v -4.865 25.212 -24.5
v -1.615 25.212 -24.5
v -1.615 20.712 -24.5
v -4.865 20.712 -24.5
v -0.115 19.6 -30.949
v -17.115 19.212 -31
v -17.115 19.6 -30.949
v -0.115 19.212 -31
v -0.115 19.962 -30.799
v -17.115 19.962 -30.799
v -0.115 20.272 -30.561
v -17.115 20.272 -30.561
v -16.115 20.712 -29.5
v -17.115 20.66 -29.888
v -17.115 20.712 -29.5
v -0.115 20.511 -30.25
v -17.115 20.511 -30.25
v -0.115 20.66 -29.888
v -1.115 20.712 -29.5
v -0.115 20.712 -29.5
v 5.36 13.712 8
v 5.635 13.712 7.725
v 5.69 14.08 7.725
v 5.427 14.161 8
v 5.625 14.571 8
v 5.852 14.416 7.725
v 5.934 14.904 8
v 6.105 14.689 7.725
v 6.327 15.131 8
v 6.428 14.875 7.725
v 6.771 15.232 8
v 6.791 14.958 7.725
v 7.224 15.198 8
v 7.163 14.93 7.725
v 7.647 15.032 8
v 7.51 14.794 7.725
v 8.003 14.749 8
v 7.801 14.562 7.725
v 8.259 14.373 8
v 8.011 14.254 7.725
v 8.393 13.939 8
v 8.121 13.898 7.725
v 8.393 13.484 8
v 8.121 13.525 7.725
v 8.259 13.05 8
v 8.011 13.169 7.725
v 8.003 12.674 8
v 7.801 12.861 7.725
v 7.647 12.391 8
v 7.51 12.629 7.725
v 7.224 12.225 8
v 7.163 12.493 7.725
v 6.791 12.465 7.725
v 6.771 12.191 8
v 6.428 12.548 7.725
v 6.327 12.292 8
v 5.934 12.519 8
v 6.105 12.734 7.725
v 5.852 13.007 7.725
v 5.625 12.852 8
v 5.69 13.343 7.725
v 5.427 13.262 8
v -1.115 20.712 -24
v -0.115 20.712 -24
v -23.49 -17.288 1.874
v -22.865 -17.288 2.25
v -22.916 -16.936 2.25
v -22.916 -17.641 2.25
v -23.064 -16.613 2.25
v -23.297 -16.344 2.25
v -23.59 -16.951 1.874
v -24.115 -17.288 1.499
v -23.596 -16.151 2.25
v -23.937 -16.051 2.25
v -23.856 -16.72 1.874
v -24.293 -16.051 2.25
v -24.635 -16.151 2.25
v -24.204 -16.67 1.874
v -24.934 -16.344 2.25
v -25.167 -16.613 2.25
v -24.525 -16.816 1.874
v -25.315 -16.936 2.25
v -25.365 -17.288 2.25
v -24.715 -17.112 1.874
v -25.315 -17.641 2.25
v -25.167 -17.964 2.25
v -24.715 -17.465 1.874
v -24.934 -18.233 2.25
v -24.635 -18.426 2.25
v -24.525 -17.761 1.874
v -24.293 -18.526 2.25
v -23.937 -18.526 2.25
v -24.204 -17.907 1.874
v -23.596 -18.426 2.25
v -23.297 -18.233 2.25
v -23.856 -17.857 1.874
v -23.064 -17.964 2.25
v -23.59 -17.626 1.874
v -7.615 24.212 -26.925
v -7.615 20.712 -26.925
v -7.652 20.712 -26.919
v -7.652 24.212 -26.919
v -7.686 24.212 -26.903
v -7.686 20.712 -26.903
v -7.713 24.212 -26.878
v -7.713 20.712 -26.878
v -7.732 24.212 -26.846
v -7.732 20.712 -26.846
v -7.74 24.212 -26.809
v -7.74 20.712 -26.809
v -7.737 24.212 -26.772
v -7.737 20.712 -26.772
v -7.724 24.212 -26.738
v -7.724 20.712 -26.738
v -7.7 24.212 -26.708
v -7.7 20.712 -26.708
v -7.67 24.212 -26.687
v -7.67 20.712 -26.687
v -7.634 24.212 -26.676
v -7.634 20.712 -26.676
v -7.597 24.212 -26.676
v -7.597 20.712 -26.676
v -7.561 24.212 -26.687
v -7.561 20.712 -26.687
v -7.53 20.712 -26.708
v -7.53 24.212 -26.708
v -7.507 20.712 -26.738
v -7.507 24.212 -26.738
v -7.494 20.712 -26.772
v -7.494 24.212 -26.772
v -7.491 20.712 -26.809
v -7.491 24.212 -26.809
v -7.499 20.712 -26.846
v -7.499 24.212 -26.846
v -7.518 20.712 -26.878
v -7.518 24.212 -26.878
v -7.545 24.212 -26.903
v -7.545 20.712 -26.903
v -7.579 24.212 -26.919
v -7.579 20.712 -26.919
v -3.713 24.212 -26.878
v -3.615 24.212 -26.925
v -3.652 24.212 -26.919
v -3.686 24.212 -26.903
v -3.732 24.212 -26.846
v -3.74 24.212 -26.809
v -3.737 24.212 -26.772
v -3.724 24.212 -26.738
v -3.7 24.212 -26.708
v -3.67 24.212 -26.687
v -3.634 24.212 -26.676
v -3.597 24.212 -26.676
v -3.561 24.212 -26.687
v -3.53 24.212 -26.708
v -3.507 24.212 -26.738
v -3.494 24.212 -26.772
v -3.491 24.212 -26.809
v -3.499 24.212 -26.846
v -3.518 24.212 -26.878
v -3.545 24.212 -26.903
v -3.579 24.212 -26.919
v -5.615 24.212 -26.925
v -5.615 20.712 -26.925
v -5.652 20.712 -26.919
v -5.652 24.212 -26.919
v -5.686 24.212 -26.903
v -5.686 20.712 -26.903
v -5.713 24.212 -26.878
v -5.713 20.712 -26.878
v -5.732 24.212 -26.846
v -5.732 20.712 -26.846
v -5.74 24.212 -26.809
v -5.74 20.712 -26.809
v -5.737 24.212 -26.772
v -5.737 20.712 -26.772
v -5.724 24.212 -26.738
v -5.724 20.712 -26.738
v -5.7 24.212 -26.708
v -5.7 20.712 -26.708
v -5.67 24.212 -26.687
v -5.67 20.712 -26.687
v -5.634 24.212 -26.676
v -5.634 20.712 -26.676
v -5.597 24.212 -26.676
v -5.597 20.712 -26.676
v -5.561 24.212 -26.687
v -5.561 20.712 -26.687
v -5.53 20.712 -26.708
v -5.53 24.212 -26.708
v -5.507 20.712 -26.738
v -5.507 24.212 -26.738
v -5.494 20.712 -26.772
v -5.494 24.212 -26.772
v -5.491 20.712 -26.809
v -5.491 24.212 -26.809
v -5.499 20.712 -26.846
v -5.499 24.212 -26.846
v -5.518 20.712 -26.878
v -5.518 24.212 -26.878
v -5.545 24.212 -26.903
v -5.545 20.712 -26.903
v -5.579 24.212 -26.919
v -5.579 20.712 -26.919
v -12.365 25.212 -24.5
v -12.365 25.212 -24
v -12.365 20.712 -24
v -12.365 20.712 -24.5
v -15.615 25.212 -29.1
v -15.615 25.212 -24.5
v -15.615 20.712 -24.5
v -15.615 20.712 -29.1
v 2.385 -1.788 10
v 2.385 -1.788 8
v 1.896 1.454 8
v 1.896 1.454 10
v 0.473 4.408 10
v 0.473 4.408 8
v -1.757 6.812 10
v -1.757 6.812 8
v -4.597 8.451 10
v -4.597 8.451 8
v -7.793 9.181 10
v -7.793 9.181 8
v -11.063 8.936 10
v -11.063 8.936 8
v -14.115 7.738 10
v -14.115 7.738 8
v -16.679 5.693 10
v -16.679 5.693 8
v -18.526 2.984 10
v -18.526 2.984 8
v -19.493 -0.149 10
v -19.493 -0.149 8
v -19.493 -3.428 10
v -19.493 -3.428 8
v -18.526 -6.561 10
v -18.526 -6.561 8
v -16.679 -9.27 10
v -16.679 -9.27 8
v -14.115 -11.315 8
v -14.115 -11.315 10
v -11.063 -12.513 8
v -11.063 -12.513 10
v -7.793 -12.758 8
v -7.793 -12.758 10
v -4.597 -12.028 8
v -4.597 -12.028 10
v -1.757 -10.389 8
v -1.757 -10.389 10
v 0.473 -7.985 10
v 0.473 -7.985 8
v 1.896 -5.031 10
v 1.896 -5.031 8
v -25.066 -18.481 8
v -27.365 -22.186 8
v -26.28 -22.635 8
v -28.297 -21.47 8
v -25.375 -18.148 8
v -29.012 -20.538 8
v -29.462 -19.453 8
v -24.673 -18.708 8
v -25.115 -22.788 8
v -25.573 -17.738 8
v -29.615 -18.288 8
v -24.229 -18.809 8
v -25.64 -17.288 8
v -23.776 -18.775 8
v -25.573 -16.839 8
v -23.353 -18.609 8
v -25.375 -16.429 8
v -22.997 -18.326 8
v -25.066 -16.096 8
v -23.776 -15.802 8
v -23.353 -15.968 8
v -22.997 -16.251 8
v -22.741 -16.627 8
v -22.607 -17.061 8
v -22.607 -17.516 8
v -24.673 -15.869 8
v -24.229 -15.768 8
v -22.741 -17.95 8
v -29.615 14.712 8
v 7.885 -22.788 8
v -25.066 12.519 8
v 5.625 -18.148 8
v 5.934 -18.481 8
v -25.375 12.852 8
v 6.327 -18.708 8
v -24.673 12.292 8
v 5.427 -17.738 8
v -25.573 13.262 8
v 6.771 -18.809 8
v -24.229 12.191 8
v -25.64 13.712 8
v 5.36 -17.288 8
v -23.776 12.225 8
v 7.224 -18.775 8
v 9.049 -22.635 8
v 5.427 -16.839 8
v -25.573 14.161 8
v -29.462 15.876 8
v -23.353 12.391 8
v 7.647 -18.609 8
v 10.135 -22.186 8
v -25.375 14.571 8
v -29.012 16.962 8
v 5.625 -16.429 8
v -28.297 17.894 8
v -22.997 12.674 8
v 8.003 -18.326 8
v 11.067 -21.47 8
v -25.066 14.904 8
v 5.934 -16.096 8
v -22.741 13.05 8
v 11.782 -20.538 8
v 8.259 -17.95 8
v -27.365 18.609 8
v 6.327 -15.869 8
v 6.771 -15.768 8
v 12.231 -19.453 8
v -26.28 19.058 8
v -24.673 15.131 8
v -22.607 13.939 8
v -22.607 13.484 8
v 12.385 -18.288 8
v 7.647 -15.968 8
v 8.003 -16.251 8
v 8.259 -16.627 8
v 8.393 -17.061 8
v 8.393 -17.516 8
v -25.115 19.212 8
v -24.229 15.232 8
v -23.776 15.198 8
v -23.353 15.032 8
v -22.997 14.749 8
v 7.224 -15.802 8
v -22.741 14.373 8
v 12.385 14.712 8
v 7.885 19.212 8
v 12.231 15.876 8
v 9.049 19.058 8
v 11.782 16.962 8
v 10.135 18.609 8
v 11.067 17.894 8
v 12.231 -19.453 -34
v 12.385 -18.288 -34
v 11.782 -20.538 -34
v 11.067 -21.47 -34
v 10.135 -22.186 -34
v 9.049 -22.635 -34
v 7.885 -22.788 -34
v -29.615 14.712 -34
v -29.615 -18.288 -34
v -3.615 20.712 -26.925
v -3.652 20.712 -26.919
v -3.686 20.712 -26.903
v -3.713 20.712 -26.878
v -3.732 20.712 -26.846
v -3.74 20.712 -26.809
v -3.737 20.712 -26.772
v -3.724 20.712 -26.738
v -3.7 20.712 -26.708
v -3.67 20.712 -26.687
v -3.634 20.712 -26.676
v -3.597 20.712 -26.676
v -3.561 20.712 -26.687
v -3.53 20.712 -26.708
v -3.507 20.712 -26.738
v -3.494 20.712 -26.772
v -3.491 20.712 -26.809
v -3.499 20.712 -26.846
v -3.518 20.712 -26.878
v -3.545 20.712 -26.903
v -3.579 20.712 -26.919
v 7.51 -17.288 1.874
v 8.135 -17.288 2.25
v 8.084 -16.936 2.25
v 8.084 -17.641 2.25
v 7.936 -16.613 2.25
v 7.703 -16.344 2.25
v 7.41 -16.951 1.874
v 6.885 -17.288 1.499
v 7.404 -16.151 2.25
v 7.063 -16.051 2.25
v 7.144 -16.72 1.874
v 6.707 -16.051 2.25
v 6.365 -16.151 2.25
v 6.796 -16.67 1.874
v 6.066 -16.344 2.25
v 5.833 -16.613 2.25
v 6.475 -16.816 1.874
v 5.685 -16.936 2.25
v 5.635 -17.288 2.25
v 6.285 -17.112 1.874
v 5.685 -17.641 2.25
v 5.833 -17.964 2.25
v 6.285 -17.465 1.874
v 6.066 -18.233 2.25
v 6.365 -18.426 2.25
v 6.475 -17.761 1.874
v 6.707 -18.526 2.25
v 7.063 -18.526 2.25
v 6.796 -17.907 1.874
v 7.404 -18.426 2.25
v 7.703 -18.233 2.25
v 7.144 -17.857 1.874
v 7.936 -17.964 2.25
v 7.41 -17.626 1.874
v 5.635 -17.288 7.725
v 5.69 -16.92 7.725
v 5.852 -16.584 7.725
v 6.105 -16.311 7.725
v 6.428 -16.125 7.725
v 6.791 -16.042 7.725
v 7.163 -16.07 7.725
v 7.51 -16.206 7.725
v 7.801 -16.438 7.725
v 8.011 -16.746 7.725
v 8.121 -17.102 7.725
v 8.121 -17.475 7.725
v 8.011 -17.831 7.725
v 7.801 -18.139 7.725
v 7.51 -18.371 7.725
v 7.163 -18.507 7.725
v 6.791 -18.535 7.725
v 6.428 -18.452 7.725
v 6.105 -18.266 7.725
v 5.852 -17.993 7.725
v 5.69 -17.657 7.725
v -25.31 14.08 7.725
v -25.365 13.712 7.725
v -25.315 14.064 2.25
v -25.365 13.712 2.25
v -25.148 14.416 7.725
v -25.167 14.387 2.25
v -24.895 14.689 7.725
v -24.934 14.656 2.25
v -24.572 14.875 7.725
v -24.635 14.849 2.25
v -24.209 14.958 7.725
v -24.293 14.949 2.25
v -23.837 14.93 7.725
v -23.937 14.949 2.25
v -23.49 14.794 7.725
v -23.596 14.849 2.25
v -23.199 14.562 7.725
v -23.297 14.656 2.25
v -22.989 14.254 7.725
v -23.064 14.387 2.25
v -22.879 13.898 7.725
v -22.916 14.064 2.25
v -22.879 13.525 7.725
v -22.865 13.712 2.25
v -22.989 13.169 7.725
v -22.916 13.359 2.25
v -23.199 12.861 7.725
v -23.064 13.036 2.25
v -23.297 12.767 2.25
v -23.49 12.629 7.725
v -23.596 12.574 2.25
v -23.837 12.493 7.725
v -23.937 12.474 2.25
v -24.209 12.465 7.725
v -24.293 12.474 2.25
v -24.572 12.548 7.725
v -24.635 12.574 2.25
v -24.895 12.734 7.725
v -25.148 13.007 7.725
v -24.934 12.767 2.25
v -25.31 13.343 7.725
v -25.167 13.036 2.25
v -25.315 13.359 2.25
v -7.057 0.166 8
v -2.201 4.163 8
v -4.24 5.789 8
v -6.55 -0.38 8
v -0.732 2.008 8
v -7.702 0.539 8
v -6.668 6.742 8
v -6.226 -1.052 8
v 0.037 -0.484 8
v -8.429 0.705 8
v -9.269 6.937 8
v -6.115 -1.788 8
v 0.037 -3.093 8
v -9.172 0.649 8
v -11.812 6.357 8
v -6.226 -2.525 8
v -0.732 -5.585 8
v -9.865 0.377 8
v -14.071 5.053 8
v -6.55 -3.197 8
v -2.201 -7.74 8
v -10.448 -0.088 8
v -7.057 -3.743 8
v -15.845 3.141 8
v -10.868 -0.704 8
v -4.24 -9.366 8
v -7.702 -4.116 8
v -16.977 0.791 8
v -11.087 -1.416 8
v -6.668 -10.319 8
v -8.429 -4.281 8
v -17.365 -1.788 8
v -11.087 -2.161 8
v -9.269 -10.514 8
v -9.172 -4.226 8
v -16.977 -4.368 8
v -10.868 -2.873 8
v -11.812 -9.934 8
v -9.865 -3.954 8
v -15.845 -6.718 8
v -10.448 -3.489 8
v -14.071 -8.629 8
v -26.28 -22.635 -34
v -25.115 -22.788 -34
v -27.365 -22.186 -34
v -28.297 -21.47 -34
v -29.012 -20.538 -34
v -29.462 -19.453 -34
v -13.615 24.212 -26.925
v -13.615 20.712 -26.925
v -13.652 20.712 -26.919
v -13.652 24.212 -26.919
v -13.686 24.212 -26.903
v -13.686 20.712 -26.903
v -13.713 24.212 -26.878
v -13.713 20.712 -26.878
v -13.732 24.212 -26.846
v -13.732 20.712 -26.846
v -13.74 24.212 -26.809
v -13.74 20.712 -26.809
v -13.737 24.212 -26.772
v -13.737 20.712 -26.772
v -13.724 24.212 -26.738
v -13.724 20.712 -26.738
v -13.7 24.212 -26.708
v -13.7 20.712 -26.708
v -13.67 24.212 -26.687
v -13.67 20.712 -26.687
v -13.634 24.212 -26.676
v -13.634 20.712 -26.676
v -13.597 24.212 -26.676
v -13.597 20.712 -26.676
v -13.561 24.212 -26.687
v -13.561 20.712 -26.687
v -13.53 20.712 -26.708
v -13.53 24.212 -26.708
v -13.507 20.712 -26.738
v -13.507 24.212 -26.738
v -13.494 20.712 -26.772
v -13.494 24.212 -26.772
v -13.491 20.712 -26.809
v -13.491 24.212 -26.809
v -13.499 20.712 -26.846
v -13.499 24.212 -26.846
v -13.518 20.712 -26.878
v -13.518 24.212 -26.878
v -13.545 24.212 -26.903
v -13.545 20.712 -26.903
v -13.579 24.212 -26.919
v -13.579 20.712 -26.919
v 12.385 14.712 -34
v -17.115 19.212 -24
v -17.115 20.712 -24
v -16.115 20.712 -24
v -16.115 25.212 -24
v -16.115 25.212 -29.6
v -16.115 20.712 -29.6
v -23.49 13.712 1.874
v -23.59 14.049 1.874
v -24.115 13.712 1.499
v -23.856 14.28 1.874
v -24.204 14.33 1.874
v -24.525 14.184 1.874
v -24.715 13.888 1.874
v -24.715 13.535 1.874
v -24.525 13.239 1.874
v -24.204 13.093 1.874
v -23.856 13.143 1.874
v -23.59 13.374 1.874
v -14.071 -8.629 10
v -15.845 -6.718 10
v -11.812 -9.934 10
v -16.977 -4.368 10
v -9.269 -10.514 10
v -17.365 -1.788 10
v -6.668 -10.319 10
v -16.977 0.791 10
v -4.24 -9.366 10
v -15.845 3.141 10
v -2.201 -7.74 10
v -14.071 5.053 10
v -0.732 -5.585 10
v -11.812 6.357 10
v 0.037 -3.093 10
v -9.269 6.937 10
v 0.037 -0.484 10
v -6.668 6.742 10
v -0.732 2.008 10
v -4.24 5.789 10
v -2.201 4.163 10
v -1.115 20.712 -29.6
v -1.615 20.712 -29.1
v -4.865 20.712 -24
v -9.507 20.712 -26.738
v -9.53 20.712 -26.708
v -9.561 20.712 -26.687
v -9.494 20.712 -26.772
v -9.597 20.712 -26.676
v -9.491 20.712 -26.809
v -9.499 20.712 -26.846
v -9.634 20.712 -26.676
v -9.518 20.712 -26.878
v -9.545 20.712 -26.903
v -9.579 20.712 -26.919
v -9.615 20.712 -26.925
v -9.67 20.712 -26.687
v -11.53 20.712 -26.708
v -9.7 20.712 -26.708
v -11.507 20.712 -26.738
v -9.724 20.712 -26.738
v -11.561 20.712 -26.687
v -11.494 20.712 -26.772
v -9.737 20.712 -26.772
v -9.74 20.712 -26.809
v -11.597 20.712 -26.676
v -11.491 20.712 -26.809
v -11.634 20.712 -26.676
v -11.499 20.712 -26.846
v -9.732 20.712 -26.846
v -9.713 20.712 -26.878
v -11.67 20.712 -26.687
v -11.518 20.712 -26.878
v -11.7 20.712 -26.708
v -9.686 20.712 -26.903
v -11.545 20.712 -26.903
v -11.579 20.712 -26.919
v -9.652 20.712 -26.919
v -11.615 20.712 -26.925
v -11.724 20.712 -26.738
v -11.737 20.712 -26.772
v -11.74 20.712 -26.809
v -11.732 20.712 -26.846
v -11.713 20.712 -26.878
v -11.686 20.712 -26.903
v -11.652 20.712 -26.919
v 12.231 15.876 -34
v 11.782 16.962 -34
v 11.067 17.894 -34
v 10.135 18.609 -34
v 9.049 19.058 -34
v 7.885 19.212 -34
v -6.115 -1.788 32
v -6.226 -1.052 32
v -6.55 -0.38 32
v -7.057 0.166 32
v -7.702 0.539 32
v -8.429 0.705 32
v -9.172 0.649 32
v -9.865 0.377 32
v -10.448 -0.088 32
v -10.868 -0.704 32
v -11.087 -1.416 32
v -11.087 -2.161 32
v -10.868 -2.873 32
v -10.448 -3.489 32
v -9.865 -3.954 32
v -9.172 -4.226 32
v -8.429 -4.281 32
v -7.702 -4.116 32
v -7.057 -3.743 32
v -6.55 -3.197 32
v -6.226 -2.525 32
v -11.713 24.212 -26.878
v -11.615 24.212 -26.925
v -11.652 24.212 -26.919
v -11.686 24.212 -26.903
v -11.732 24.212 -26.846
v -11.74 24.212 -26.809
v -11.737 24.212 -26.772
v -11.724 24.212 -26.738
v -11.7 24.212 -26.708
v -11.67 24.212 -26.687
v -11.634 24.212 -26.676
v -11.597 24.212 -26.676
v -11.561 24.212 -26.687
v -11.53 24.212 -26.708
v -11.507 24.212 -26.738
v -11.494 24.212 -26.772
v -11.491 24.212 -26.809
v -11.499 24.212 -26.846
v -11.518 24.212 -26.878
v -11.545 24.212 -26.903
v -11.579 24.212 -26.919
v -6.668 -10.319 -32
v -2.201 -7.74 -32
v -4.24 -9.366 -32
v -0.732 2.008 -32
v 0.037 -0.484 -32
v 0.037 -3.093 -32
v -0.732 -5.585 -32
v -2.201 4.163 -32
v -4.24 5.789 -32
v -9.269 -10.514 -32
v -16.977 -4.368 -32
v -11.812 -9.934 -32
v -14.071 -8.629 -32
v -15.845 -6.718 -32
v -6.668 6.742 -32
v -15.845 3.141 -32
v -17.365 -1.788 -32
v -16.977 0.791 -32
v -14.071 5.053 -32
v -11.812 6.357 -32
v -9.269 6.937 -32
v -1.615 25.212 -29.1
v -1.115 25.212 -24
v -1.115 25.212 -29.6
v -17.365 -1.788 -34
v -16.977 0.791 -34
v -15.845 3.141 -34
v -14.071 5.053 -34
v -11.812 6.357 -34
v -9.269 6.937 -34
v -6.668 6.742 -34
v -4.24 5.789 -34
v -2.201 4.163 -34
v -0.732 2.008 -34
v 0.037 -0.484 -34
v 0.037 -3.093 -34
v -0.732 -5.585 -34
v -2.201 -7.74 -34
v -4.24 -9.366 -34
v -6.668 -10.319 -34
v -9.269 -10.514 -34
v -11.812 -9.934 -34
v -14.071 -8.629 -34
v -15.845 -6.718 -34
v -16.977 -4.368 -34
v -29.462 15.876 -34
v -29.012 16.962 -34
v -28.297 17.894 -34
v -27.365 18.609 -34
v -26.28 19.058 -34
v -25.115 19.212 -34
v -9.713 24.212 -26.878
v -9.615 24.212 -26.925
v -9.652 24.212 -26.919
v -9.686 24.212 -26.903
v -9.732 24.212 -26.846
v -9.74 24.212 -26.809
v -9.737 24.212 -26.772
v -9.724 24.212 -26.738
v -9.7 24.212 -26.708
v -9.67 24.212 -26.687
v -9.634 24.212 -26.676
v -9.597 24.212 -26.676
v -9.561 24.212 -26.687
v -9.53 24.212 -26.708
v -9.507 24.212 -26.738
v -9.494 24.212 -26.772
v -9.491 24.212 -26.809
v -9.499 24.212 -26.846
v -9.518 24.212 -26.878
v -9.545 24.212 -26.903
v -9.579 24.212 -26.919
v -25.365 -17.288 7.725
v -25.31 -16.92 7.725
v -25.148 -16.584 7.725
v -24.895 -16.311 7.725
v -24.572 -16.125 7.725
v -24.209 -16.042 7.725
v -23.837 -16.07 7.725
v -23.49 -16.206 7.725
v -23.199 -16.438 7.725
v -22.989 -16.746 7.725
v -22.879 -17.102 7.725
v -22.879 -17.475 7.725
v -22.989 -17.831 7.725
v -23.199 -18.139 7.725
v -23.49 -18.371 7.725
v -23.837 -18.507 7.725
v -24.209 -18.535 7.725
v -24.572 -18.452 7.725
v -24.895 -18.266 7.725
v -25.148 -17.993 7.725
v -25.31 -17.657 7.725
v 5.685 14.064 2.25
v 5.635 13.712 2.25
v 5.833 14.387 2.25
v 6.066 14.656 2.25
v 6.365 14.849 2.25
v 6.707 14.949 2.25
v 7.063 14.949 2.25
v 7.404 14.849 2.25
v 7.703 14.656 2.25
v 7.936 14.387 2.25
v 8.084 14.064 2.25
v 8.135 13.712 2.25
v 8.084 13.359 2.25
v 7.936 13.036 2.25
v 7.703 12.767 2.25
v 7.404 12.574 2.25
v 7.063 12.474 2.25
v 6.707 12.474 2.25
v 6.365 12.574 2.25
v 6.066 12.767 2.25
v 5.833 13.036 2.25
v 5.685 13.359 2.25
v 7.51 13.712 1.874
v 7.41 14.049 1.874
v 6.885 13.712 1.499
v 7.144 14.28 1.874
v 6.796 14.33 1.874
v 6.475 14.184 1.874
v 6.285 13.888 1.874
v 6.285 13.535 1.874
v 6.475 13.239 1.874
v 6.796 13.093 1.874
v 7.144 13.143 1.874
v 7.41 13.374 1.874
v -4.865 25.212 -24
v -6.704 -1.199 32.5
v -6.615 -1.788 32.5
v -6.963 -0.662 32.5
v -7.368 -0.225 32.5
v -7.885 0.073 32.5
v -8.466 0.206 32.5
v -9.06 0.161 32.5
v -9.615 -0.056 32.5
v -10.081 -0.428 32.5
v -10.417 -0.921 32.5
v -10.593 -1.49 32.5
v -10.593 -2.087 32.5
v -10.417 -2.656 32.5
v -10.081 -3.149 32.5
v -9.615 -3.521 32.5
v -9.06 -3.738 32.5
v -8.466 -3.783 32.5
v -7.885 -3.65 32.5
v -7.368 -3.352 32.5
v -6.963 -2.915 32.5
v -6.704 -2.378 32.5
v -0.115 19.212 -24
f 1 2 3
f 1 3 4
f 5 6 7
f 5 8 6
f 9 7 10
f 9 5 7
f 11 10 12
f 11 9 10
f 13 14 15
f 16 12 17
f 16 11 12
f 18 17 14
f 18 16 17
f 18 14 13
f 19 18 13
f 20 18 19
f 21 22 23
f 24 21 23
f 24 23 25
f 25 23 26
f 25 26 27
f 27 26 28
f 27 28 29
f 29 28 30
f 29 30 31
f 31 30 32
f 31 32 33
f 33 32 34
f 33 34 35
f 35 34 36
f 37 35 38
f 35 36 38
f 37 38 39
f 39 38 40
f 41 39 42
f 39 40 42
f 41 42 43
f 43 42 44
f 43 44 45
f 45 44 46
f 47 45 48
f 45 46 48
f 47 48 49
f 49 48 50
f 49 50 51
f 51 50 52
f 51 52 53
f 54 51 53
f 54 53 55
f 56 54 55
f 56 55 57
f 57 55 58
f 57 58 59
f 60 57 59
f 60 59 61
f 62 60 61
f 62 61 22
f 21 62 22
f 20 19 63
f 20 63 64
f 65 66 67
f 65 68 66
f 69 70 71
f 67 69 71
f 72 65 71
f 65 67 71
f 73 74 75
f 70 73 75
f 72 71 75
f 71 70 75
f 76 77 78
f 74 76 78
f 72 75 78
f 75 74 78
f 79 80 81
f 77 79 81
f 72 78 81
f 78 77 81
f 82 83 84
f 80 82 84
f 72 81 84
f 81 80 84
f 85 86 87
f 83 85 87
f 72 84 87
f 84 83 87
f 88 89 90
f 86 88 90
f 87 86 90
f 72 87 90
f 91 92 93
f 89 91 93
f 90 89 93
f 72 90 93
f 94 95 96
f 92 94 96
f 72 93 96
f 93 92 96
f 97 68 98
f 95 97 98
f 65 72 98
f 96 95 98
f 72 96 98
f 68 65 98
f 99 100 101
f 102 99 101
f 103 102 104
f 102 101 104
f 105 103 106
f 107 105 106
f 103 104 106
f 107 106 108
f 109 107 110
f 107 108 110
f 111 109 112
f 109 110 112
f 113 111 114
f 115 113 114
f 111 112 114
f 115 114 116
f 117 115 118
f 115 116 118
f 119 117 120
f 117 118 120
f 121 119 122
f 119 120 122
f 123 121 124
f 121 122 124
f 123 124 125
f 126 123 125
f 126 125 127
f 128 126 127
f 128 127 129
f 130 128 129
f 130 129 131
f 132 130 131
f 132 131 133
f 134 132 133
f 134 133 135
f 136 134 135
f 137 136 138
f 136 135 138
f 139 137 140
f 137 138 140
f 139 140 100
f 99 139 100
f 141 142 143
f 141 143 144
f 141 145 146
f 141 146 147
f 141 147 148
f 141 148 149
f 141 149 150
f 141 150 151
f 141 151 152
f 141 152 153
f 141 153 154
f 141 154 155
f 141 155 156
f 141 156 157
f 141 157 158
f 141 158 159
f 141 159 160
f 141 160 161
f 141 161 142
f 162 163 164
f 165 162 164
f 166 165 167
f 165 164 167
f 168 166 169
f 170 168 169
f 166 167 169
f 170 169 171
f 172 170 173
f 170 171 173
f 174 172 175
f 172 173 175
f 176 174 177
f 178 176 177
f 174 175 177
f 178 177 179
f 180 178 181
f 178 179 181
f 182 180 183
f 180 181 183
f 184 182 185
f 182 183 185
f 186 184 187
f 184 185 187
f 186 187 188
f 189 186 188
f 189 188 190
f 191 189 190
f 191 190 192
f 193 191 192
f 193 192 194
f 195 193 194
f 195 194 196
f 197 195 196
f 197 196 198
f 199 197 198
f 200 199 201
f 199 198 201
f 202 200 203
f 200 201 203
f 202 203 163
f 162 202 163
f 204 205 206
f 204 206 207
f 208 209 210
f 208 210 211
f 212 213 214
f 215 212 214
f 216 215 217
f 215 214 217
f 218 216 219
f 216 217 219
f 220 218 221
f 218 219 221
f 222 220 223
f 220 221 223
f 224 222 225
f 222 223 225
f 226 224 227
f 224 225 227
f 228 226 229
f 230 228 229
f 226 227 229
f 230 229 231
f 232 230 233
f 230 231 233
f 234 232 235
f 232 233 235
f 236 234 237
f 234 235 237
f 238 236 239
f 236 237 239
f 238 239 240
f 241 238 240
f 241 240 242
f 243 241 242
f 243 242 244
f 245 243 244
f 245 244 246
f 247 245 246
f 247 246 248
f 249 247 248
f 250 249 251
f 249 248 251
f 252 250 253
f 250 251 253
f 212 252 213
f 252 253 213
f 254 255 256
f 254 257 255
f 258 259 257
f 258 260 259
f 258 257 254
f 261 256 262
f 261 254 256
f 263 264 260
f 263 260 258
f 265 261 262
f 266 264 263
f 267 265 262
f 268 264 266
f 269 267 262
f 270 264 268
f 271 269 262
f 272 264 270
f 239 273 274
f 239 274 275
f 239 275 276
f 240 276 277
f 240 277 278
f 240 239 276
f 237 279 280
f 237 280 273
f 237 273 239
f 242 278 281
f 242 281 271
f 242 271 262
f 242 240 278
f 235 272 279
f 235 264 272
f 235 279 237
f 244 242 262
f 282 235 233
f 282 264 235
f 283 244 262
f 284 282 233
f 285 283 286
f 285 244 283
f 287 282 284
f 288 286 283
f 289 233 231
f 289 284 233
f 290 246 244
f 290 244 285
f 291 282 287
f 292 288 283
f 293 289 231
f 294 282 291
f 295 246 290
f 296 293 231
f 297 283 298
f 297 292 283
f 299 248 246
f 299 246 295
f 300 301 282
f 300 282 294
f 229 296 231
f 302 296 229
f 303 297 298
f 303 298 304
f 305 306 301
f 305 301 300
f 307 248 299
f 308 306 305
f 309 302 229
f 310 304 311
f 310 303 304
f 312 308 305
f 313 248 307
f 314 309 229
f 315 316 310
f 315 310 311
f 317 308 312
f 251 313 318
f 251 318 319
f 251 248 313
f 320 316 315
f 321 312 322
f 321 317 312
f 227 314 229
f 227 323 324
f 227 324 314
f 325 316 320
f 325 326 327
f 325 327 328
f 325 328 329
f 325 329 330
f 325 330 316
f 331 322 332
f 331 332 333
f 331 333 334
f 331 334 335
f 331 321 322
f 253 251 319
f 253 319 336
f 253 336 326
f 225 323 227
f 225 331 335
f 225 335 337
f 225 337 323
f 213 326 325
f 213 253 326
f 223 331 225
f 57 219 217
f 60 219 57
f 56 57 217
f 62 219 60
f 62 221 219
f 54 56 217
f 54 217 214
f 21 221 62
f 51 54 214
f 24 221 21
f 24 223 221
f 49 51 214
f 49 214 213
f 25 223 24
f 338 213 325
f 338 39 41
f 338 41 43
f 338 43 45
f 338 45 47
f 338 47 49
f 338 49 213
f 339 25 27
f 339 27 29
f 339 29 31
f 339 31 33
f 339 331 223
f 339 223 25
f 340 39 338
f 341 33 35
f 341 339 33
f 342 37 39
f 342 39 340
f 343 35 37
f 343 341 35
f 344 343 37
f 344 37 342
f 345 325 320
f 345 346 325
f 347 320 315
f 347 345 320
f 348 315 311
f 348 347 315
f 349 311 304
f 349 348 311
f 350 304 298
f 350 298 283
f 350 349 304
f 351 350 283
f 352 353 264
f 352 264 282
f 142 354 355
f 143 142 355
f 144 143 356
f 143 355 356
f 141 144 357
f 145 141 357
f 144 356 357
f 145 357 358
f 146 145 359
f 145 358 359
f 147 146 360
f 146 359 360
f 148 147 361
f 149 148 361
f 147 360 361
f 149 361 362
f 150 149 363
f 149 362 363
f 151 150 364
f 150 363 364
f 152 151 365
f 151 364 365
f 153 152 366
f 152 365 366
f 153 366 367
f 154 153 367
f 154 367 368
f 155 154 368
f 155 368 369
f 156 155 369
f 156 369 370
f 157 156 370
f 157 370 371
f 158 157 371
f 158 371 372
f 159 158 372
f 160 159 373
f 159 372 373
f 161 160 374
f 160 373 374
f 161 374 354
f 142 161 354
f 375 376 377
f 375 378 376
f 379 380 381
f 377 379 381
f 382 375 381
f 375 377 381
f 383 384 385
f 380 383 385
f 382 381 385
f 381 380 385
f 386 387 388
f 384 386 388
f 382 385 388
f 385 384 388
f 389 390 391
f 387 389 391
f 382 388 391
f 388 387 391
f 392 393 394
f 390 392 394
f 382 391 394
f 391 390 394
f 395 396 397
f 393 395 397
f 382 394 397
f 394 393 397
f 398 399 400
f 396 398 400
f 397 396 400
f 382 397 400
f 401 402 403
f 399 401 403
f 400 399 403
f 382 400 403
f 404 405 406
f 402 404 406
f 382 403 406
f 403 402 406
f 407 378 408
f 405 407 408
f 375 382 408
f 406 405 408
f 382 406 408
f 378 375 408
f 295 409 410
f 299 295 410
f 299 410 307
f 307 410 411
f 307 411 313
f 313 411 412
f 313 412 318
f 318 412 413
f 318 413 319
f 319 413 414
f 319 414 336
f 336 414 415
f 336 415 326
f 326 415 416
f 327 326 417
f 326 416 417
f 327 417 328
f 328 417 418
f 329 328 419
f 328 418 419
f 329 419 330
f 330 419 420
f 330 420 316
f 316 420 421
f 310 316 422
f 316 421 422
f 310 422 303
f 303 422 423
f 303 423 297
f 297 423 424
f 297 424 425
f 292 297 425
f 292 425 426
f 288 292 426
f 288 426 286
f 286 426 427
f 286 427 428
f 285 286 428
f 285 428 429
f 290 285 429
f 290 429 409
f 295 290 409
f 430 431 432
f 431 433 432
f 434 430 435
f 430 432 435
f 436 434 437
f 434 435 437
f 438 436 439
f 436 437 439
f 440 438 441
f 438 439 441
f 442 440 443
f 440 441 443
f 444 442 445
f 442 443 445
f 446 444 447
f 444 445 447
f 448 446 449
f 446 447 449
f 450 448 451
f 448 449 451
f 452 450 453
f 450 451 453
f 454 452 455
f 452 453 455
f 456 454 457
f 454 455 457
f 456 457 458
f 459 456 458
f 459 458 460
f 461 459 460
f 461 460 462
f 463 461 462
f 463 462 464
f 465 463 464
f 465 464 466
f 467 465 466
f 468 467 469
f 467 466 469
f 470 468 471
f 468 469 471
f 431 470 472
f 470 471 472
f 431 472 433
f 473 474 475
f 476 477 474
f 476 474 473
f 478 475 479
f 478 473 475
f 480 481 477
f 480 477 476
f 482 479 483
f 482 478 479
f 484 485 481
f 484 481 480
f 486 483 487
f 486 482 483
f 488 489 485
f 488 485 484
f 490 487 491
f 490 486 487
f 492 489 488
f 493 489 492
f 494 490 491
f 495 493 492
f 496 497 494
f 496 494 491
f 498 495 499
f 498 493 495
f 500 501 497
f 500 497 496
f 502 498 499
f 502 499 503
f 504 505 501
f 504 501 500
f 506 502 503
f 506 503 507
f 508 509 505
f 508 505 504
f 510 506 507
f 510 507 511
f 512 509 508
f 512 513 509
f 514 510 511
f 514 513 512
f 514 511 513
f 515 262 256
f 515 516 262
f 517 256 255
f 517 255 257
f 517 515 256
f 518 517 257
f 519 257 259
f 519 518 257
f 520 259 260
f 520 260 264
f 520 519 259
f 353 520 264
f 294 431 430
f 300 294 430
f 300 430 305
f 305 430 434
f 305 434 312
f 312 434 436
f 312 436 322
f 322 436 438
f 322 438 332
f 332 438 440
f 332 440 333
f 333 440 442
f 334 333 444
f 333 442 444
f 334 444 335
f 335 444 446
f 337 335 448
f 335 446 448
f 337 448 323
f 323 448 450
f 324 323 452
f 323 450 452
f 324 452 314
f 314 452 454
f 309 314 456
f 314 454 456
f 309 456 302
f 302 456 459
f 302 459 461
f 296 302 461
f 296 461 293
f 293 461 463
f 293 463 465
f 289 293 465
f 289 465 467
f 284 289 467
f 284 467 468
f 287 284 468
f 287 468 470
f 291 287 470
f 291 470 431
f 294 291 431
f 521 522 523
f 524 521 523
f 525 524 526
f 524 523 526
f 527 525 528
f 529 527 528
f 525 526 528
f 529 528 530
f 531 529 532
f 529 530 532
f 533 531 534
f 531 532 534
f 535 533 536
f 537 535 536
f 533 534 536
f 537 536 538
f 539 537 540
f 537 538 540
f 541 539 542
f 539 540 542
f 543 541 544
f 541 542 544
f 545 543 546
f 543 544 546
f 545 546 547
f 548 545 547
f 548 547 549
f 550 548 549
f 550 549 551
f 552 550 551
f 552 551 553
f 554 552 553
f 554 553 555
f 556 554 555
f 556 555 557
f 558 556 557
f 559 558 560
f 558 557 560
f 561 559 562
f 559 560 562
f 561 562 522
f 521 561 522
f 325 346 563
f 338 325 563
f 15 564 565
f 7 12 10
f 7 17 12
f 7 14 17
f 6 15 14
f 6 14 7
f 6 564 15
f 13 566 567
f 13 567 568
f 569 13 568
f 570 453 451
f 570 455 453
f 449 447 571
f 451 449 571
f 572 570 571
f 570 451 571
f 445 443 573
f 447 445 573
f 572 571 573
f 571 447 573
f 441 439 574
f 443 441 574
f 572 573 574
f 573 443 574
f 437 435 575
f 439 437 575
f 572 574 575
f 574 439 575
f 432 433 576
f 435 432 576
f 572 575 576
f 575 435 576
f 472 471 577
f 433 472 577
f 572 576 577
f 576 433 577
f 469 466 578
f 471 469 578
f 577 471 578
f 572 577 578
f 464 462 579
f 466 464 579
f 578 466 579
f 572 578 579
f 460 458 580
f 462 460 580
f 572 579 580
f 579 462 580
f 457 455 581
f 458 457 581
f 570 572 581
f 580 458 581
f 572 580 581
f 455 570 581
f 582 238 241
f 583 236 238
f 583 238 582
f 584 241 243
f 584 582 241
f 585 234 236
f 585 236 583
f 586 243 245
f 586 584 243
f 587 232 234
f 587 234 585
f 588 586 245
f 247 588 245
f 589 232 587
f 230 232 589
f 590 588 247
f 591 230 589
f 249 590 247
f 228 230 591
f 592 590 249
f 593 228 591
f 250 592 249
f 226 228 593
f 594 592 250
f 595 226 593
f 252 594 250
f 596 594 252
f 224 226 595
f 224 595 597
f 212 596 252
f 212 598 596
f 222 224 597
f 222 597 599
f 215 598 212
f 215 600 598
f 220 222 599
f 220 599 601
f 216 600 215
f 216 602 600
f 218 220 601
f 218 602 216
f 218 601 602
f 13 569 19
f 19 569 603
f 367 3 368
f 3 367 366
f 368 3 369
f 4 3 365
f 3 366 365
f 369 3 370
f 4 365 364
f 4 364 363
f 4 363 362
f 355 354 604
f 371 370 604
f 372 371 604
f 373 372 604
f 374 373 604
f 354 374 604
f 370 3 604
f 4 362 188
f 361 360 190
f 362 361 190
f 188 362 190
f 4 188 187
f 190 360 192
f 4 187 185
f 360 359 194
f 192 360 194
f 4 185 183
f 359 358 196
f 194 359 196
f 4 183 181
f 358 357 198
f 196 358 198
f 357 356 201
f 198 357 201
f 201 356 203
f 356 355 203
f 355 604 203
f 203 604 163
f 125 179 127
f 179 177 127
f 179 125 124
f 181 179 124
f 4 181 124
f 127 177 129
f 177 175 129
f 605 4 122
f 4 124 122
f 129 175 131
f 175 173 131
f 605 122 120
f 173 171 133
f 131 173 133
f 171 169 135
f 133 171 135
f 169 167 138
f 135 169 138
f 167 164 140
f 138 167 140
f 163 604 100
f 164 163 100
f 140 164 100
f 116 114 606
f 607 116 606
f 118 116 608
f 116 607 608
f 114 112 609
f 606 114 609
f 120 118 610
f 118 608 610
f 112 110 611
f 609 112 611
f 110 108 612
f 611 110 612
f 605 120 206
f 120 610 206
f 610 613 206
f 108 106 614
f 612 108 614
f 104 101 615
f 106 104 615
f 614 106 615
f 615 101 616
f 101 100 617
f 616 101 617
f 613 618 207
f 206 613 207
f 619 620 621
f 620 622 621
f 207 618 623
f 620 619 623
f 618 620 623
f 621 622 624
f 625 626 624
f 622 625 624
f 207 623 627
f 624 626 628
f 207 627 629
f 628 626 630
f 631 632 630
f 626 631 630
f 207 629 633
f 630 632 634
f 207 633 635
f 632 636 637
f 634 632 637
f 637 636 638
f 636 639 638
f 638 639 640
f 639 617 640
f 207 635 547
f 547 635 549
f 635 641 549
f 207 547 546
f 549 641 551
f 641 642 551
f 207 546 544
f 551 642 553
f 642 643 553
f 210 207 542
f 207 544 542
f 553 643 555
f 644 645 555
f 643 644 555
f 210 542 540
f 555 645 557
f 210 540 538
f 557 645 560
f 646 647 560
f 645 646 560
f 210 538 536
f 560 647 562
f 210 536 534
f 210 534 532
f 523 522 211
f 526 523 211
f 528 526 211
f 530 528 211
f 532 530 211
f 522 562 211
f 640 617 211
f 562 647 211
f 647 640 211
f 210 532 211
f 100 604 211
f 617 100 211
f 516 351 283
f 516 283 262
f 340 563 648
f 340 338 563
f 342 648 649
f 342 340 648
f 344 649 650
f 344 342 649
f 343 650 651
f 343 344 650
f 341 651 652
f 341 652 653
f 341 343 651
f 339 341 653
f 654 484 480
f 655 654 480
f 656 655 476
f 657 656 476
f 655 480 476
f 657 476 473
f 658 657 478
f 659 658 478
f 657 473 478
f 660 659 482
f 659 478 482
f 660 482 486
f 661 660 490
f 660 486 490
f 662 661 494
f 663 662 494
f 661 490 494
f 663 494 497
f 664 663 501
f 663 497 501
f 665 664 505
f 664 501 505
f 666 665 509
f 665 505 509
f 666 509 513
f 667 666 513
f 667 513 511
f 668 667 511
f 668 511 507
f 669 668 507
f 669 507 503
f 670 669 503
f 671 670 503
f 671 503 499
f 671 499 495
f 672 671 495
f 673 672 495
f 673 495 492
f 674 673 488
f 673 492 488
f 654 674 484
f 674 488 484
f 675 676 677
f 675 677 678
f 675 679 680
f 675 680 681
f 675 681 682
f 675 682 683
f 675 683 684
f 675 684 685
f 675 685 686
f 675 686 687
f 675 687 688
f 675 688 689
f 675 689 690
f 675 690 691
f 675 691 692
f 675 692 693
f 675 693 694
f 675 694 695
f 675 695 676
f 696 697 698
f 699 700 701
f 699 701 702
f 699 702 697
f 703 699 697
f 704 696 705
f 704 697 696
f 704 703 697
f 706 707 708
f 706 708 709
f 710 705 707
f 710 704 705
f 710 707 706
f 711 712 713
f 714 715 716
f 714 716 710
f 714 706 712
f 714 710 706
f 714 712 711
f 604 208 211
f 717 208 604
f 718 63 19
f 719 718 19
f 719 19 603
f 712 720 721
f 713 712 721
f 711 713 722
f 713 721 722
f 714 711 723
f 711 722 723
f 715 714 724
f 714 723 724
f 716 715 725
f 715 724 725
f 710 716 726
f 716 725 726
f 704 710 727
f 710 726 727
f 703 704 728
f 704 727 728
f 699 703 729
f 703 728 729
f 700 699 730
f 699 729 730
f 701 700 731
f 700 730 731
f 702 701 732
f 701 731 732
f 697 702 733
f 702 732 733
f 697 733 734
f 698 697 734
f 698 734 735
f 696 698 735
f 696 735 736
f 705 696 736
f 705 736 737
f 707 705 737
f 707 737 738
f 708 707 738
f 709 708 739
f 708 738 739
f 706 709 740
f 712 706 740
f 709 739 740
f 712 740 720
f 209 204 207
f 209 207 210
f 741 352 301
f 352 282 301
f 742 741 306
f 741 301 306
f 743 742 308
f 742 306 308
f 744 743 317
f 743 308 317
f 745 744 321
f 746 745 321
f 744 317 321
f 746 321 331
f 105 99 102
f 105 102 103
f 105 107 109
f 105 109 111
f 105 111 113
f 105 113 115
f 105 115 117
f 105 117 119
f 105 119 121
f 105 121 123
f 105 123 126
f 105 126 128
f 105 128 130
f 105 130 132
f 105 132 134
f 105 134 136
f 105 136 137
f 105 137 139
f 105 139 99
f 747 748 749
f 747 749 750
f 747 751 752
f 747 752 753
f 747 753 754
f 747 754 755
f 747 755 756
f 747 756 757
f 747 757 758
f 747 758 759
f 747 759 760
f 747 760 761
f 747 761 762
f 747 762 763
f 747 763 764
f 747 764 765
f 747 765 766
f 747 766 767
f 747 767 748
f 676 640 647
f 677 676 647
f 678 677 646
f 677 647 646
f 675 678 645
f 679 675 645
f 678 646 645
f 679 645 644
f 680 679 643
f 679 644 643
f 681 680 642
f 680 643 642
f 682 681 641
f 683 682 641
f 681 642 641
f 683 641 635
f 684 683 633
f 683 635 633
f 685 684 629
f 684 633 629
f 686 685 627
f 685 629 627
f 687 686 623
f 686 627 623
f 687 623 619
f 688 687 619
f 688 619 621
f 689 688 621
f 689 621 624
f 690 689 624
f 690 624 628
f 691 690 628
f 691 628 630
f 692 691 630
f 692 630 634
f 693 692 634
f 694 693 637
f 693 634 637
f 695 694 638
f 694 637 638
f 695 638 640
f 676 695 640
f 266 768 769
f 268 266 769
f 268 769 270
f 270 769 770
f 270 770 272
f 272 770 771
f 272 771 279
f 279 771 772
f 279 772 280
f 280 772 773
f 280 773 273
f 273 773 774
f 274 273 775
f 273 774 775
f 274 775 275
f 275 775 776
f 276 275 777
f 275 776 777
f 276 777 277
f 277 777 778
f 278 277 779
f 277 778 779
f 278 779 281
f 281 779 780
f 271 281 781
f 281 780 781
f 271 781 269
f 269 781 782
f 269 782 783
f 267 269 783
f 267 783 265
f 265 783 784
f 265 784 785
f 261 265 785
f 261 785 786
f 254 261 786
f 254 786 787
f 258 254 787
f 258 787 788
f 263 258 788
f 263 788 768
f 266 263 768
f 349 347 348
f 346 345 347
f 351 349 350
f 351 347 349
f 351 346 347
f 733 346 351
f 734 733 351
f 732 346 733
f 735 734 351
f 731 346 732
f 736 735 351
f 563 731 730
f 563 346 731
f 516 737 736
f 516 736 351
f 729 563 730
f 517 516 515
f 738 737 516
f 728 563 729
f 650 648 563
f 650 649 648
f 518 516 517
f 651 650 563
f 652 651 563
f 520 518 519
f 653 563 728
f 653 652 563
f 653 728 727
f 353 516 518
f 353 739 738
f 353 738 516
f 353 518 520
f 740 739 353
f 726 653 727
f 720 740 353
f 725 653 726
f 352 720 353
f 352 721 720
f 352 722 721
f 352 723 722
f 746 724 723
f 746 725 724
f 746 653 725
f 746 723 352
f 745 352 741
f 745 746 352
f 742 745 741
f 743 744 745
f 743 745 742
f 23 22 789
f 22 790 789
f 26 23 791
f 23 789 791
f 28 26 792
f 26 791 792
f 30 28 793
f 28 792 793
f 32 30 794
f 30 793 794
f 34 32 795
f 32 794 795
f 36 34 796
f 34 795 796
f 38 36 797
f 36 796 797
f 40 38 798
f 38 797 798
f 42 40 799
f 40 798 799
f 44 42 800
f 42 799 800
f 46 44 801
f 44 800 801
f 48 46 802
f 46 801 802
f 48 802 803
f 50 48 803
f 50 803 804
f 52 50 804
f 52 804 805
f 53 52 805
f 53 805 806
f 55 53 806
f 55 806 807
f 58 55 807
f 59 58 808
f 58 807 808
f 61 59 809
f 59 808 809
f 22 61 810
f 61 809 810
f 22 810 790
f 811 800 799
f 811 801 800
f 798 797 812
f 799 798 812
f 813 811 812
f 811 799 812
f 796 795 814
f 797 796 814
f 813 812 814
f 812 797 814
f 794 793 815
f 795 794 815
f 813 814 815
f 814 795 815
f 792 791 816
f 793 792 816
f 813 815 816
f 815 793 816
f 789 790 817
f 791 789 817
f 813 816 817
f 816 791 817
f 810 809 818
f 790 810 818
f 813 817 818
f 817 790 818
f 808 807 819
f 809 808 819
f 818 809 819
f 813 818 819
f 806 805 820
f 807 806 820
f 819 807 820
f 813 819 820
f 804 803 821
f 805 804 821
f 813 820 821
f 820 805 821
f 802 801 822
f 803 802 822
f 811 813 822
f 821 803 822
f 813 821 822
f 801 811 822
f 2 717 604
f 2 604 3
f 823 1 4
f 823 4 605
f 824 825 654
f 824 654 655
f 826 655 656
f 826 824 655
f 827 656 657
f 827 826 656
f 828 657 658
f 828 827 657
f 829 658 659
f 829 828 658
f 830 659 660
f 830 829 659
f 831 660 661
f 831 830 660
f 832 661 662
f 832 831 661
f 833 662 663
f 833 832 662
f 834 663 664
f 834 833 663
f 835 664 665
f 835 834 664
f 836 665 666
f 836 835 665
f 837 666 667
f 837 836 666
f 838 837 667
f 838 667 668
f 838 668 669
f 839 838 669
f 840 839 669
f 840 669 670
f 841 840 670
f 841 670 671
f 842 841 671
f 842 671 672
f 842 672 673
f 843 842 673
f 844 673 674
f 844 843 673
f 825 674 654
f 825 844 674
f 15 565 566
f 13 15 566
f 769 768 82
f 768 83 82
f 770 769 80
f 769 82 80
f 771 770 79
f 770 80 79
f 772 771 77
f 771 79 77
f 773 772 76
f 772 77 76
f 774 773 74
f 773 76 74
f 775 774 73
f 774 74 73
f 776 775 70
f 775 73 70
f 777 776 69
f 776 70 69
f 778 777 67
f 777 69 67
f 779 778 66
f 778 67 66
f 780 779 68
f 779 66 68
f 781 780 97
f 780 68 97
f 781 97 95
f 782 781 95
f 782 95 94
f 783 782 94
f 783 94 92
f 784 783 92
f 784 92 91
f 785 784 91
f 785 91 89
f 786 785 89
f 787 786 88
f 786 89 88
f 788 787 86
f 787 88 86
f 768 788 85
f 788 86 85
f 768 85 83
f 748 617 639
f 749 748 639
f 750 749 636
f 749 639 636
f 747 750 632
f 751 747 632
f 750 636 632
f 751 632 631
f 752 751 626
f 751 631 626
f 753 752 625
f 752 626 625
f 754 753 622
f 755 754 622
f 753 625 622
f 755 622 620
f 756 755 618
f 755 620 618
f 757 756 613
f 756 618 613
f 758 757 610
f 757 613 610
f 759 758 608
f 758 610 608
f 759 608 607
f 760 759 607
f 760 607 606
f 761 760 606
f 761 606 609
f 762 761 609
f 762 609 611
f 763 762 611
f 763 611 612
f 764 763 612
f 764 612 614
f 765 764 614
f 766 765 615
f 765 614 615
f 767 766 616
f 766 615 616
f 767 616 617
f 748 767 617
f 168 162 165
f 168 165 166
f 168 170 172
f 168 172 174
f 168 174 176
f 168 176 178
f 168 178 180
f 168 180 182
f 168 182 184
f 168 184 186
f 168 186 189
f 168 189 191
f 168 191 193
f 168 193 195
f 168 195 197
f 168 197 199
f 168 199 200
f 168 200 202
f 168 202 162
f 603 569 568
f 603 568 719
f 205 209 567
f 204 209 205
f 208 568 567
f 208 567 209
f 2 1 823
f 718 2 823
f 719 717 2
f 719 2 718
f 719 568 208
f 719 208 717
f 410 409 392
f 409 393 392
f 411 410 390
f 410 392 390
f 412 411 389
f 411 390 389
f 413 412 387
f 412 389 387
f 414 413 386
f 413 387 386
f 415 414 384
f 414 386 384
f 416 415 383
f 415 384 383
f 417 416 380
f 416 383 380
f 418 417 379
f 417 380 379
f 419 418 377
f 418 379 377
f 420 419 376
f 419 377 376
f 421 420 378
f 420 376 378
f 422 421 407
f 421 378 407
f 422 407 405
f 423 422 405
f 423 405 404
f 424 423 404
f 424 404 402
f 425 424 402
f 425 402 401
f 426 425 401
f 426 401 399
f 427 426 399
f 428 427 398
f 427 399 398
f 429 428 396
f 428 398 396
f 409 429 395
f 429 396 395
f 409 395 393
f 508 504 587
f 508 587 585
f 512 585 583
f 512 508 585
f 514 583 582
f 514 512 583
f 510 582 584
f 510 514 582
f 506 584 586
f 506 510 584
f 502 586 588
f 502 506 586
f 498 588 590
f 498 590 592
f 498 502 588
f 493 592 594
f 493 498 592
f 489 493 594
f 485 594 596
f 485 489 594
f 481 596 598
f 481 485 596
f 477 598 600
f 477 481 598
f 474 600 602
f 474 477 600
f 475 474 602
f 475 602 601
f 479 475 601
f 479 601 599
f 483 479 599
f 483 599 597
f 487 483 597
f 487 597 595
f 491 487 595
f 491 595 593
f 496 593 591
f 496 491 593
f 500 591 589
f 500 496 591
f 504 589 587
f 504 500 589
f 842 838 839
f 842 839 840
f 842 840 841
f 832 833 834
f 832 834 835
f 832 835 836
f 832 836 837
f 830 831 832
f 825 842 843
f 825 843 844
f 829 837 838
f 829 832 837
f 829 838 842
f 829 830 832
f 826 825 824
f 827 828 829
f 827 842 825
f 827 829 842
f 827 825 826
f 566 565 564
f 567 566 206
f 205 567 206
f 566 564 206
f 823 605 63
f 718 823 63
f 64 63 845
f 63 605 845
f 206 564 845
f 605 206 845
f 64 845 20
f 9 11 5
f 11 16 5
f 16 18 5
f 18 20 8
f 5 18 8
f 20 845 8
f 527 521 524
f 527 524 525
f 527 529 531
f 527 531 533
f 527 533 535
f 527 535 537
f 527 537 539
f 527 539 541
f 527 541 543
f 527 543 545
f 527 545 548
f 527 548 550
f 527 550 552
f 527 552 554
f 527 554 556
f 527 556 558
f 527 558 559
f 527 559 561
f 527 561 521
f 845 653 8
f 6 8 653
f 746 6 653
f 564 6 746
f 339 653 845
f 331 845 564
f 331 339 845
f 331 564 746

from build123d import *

# Parameters (mm, degrees)
SKETCH1_W                       = 42
SKETCH1_H                       = 42
BOSS_EXTRUDE2_DEPTH             = 8
SKETCH2_R                       = 11
BOSS_EXTRUDE3_DEPTH             = 2
SKETCH4_W                       = 42
SKETCH4_H                       = 42
BOSS_EXTRUDE5_DEPTH             = 24
SKETCH5_W                       = 42
SKETCH5_H                       = 42
BOSS_EXTRUDE6_DEPTH             = 10
FILLET1_R                       = 4.5
SKETCH7_R                       = 8.75
CUT_EXTRUDE1_DEPTH              = 2
CUT_EXTRUDE2_START              = -2
SKETCH8_R                       = 8.75
CUT_EXTRUDE2_DEPTH              = 2
SKETCH9_R                       = 2.5
BOSS_EXTRUDE9_DEPTH             = 24.5
CHAMFER2_SIZE                   = 0.5
M3X0_5_TAPPED_HOLE1_D           = 2.5
M3X0_5_TAPPED_HOLE1_DEPTH       = 5.75
M3X0_5_TAPPED_HOLE1_CSINK_D     = 3.05
M3X0_5_TAPPED_HOLE1_CSINK_ANGLE = 90
M3X0_5_TAPPED_HOLE1_TIP         = 0.751075774
SKETCH12_W                      = 17
SKETCH12_H                      = 7
BOSS_EXTRUDE10_DEPTH            = 1.5
FILLET2_R                       = 1.5
SKETCH13_W                      = 15
SKETCH13_H                      = 5.6
BOSS_EXTRUDE11_DEPTH            = 4.5
CUT_EXTRUDE3_DEPTH              = 4.5
SKETCH16_R                      = 0.125
BOSS_EXTRUDE12_DEPTH            = 3.5
LPATTERN1_COUNT                 = 6
LPATTERN1_PITCH                 = 2


with BuildPart() as part:
    # Sketch1 → Boss-Extrude2 (new body)
    with BuildSketch(Plane.XY):
        with Locations((-8.615384615, -1.788461538)):
            Rectangle(SKETCH1_W, SKETCH1_H)
    extrude(amount=BOSS_EXTRUDE2_DEPTH)

    # Sketch2 → Boss-Extrude3 (add)
    with BuildSketch(Plane.XY.offset(8)):
        with Locations((-8.615384615, -1.788461538)):
            Circle(SKETCH2_R)
    extrude(amount=BOSS_EXTRUDE3_DEPTH)

    # Sketch4 → Boss-Extrude5 (add)
    with BuildSketch(Plane(origin=(0, 0, 0), x_dir=(-1, 0, 0), z_dir=(0, 0, -1))):
        with Locations((8.615384615, -1.788461538)):
            Rectangle(SKETCH4_W, SKETCH4_H)
    extrude(amount=BOSS_EXTRUDE5_DEPTH)

    # Sketch5 → Boss-Extrude6 (add)
    with BuildSketch(Plane(origin=(0, 0, -24), x_dir=(-1, 0, 0), z_dir=(0, 0, -1))):
        with Locations((8.615384615, -1.788461538)):
            Rectangle(SKETCH5_W, SKETCH5_H)
    extrude(amount=BOSS_EXTRUDE6_DEPTH)

    # Fillet1
    fillet1_edges = [part.edges().sort_by_distance(p)[0] for p in [
        (-29.615384615, 19.211538462, -13),
        (12.384615385, 19.211538462, -13),
        (12.384615385, -22.788461538, -13),
        (-29.615384615, -22.788461538, -13),
    ]]
    fillet(fillet1_edges, radius=FILLET1_R)

    # Sketch7 → Cut-Extrude1 (cut)
    with BuildSketch(Plane(origin=(0, 0, -34), x_dir=(-1, 0, 0), z_dir=(0, 0, -1))):
        with Locations((8.615384615, -1.788461538)):
            Circle(SKETCH7_R)
    extrude(amount=-CUT_EXTRUDE1_DEPTH, mode=Mode.SUBTRACT)

    # Sketch8 → Cut-Extrude2 (cut)
    with BuildSketch(Plane.XY.offset(10).offset(CUT_EXTRUDE2_START)):
        with Locations(Location((-8.615384615, -1.788461538, 0), (0, 0, 180))):
            Circle(SKETCH8_R)
    extrude(amount=CUT_EXTRUDE2_DEPTH, mode=Mode.SUBTRACT)

    # Sketch9 → Boss-Extrude9 (add)
    with BuildSketch(Plane.XY.offset(8)):
        with Locations((-8.615384615, -1.788461538)):
            Circle(SKETCH9_R)
    extrude(amount=BOSS_EXTRUDE9_DEPTH)

    # Chamfer2
    chamfer2_edges = [part.edges().sort_by_distance(p)[0] for p in [
        (-11.115384615, -1.788461538, 32.5),
    ]]
    chamfer(chamfer2_edges, length=CHAMFER2_SIZE)

    # M3x0.5 Tapped Hole1
    with Locations(Plane(origin=(-24.115384615, 13.711538462, 8), x_dir=(1, 0, 0), z_dir=(0, 0, 1))):
        with Locations((0, 0), (31, 0), (31, -31), (0, -31)):
            CounterSinkHole(M3X0_5_TAPPED_HOLE1_D / 2, M3X0_5_TAPPED_HOLE1_CSINK_D / 2, depth=M3X0_5_TAPPED_HOLE1_DEPTH, counter_sink_angle=M3X0_5_TAPPED_HOLE1_CSINK_ANGLE)
            with Locations((0, 0, -(M3X0_5_TAPPED_HOLE1_DEPTH + M3X0_5_TAPPED_HOLE1_TIP / 2))):  # 118° drill point
                Cone(0, M3X0_5_TAPPED_HOLE1_D / 2, M3X0_5_TAPPED_HOLE1_TIP, mode=Mode.SUBTRACT)

    # Sketch12 → Boss-Extrude10 (add)
    with BuildSketch(Plane(origin=(0, 19.211538462, 0), x_dir=(1, 0, 0), z_dir=(0, 1, 0))):
        with Locations((-8.615384615, 27.5)):
            Rectangle(SKETCH12_W, SKETCH12_H)
    extrude(amount=BOSS_EXTRUDE10_DEPTH)

    # Fillet2
    fillet2_edges = [part.edges().sort_by_distance(p)[0] for p in [
        (-8.615384615, 20.711538462, -31),
    ]]
    fillet(fillet2_edges, radius=FILLET2_R - 0.0001)  # a hair under: the kernel refuses the full size

    # Sketch13 → Boss-Extrude11 (add)
    with BuildSketch(Plane(origin=(0, 20.711538462, 0), x_dir=(1, 0, 0), z_dir=(0, 1, 0))):
        with Locations((-8.615384615, 26.8)):
            Rectangle(SKETCH13_W, SKETCH13_H)
    extrude(amount=BOSS_EXTRUDE11_DEPTH)

    # Sketch15 → Cut-Extrude3 (cut)
    with BuildSketch(Plane(origin=(0, 25.211538462, 0), x_dir=(1, 0, 0), z_dir=(0, 1, 0))):
        Polygon((-12.365384615, 24), (-12.365384615, 24.5), (-15.615384615, 24.5), (-15.615384615, 29.1), (-1.615384615, 29.1), (-1.615384615, 24.5), (-4.865384615, 24.5), (-4.865384615, 24), align=None)
    extrude(amount=-CUT_EXTRUDE3_DEPTH, mode=Mode.SUBTRACT)

    # Sketch16 → Boss-Extrude12 (add)
    with BuildSketch(Plane(origin=(0, 20.711538462, 0), x_dir=(1, 0, 0), z_dir=(0, 1, 0))):
        with Locations(Location((-13.615384615, 26.8, 0), (0, 0, 90))):
            Circle(SKETCH16_R)
    boss_extrude12 = extrude(amount=BOSS_EXTRUDE12_DEPTH)

    # LPattern1: Boss-Extrude12 ×6
    with Locations(*[(i * LPATTERN1_PITCH, 0, 0) for i in range(1, LPATTERN1_COUNT)]):
        add(boss_extrude12)


solid = part.part
